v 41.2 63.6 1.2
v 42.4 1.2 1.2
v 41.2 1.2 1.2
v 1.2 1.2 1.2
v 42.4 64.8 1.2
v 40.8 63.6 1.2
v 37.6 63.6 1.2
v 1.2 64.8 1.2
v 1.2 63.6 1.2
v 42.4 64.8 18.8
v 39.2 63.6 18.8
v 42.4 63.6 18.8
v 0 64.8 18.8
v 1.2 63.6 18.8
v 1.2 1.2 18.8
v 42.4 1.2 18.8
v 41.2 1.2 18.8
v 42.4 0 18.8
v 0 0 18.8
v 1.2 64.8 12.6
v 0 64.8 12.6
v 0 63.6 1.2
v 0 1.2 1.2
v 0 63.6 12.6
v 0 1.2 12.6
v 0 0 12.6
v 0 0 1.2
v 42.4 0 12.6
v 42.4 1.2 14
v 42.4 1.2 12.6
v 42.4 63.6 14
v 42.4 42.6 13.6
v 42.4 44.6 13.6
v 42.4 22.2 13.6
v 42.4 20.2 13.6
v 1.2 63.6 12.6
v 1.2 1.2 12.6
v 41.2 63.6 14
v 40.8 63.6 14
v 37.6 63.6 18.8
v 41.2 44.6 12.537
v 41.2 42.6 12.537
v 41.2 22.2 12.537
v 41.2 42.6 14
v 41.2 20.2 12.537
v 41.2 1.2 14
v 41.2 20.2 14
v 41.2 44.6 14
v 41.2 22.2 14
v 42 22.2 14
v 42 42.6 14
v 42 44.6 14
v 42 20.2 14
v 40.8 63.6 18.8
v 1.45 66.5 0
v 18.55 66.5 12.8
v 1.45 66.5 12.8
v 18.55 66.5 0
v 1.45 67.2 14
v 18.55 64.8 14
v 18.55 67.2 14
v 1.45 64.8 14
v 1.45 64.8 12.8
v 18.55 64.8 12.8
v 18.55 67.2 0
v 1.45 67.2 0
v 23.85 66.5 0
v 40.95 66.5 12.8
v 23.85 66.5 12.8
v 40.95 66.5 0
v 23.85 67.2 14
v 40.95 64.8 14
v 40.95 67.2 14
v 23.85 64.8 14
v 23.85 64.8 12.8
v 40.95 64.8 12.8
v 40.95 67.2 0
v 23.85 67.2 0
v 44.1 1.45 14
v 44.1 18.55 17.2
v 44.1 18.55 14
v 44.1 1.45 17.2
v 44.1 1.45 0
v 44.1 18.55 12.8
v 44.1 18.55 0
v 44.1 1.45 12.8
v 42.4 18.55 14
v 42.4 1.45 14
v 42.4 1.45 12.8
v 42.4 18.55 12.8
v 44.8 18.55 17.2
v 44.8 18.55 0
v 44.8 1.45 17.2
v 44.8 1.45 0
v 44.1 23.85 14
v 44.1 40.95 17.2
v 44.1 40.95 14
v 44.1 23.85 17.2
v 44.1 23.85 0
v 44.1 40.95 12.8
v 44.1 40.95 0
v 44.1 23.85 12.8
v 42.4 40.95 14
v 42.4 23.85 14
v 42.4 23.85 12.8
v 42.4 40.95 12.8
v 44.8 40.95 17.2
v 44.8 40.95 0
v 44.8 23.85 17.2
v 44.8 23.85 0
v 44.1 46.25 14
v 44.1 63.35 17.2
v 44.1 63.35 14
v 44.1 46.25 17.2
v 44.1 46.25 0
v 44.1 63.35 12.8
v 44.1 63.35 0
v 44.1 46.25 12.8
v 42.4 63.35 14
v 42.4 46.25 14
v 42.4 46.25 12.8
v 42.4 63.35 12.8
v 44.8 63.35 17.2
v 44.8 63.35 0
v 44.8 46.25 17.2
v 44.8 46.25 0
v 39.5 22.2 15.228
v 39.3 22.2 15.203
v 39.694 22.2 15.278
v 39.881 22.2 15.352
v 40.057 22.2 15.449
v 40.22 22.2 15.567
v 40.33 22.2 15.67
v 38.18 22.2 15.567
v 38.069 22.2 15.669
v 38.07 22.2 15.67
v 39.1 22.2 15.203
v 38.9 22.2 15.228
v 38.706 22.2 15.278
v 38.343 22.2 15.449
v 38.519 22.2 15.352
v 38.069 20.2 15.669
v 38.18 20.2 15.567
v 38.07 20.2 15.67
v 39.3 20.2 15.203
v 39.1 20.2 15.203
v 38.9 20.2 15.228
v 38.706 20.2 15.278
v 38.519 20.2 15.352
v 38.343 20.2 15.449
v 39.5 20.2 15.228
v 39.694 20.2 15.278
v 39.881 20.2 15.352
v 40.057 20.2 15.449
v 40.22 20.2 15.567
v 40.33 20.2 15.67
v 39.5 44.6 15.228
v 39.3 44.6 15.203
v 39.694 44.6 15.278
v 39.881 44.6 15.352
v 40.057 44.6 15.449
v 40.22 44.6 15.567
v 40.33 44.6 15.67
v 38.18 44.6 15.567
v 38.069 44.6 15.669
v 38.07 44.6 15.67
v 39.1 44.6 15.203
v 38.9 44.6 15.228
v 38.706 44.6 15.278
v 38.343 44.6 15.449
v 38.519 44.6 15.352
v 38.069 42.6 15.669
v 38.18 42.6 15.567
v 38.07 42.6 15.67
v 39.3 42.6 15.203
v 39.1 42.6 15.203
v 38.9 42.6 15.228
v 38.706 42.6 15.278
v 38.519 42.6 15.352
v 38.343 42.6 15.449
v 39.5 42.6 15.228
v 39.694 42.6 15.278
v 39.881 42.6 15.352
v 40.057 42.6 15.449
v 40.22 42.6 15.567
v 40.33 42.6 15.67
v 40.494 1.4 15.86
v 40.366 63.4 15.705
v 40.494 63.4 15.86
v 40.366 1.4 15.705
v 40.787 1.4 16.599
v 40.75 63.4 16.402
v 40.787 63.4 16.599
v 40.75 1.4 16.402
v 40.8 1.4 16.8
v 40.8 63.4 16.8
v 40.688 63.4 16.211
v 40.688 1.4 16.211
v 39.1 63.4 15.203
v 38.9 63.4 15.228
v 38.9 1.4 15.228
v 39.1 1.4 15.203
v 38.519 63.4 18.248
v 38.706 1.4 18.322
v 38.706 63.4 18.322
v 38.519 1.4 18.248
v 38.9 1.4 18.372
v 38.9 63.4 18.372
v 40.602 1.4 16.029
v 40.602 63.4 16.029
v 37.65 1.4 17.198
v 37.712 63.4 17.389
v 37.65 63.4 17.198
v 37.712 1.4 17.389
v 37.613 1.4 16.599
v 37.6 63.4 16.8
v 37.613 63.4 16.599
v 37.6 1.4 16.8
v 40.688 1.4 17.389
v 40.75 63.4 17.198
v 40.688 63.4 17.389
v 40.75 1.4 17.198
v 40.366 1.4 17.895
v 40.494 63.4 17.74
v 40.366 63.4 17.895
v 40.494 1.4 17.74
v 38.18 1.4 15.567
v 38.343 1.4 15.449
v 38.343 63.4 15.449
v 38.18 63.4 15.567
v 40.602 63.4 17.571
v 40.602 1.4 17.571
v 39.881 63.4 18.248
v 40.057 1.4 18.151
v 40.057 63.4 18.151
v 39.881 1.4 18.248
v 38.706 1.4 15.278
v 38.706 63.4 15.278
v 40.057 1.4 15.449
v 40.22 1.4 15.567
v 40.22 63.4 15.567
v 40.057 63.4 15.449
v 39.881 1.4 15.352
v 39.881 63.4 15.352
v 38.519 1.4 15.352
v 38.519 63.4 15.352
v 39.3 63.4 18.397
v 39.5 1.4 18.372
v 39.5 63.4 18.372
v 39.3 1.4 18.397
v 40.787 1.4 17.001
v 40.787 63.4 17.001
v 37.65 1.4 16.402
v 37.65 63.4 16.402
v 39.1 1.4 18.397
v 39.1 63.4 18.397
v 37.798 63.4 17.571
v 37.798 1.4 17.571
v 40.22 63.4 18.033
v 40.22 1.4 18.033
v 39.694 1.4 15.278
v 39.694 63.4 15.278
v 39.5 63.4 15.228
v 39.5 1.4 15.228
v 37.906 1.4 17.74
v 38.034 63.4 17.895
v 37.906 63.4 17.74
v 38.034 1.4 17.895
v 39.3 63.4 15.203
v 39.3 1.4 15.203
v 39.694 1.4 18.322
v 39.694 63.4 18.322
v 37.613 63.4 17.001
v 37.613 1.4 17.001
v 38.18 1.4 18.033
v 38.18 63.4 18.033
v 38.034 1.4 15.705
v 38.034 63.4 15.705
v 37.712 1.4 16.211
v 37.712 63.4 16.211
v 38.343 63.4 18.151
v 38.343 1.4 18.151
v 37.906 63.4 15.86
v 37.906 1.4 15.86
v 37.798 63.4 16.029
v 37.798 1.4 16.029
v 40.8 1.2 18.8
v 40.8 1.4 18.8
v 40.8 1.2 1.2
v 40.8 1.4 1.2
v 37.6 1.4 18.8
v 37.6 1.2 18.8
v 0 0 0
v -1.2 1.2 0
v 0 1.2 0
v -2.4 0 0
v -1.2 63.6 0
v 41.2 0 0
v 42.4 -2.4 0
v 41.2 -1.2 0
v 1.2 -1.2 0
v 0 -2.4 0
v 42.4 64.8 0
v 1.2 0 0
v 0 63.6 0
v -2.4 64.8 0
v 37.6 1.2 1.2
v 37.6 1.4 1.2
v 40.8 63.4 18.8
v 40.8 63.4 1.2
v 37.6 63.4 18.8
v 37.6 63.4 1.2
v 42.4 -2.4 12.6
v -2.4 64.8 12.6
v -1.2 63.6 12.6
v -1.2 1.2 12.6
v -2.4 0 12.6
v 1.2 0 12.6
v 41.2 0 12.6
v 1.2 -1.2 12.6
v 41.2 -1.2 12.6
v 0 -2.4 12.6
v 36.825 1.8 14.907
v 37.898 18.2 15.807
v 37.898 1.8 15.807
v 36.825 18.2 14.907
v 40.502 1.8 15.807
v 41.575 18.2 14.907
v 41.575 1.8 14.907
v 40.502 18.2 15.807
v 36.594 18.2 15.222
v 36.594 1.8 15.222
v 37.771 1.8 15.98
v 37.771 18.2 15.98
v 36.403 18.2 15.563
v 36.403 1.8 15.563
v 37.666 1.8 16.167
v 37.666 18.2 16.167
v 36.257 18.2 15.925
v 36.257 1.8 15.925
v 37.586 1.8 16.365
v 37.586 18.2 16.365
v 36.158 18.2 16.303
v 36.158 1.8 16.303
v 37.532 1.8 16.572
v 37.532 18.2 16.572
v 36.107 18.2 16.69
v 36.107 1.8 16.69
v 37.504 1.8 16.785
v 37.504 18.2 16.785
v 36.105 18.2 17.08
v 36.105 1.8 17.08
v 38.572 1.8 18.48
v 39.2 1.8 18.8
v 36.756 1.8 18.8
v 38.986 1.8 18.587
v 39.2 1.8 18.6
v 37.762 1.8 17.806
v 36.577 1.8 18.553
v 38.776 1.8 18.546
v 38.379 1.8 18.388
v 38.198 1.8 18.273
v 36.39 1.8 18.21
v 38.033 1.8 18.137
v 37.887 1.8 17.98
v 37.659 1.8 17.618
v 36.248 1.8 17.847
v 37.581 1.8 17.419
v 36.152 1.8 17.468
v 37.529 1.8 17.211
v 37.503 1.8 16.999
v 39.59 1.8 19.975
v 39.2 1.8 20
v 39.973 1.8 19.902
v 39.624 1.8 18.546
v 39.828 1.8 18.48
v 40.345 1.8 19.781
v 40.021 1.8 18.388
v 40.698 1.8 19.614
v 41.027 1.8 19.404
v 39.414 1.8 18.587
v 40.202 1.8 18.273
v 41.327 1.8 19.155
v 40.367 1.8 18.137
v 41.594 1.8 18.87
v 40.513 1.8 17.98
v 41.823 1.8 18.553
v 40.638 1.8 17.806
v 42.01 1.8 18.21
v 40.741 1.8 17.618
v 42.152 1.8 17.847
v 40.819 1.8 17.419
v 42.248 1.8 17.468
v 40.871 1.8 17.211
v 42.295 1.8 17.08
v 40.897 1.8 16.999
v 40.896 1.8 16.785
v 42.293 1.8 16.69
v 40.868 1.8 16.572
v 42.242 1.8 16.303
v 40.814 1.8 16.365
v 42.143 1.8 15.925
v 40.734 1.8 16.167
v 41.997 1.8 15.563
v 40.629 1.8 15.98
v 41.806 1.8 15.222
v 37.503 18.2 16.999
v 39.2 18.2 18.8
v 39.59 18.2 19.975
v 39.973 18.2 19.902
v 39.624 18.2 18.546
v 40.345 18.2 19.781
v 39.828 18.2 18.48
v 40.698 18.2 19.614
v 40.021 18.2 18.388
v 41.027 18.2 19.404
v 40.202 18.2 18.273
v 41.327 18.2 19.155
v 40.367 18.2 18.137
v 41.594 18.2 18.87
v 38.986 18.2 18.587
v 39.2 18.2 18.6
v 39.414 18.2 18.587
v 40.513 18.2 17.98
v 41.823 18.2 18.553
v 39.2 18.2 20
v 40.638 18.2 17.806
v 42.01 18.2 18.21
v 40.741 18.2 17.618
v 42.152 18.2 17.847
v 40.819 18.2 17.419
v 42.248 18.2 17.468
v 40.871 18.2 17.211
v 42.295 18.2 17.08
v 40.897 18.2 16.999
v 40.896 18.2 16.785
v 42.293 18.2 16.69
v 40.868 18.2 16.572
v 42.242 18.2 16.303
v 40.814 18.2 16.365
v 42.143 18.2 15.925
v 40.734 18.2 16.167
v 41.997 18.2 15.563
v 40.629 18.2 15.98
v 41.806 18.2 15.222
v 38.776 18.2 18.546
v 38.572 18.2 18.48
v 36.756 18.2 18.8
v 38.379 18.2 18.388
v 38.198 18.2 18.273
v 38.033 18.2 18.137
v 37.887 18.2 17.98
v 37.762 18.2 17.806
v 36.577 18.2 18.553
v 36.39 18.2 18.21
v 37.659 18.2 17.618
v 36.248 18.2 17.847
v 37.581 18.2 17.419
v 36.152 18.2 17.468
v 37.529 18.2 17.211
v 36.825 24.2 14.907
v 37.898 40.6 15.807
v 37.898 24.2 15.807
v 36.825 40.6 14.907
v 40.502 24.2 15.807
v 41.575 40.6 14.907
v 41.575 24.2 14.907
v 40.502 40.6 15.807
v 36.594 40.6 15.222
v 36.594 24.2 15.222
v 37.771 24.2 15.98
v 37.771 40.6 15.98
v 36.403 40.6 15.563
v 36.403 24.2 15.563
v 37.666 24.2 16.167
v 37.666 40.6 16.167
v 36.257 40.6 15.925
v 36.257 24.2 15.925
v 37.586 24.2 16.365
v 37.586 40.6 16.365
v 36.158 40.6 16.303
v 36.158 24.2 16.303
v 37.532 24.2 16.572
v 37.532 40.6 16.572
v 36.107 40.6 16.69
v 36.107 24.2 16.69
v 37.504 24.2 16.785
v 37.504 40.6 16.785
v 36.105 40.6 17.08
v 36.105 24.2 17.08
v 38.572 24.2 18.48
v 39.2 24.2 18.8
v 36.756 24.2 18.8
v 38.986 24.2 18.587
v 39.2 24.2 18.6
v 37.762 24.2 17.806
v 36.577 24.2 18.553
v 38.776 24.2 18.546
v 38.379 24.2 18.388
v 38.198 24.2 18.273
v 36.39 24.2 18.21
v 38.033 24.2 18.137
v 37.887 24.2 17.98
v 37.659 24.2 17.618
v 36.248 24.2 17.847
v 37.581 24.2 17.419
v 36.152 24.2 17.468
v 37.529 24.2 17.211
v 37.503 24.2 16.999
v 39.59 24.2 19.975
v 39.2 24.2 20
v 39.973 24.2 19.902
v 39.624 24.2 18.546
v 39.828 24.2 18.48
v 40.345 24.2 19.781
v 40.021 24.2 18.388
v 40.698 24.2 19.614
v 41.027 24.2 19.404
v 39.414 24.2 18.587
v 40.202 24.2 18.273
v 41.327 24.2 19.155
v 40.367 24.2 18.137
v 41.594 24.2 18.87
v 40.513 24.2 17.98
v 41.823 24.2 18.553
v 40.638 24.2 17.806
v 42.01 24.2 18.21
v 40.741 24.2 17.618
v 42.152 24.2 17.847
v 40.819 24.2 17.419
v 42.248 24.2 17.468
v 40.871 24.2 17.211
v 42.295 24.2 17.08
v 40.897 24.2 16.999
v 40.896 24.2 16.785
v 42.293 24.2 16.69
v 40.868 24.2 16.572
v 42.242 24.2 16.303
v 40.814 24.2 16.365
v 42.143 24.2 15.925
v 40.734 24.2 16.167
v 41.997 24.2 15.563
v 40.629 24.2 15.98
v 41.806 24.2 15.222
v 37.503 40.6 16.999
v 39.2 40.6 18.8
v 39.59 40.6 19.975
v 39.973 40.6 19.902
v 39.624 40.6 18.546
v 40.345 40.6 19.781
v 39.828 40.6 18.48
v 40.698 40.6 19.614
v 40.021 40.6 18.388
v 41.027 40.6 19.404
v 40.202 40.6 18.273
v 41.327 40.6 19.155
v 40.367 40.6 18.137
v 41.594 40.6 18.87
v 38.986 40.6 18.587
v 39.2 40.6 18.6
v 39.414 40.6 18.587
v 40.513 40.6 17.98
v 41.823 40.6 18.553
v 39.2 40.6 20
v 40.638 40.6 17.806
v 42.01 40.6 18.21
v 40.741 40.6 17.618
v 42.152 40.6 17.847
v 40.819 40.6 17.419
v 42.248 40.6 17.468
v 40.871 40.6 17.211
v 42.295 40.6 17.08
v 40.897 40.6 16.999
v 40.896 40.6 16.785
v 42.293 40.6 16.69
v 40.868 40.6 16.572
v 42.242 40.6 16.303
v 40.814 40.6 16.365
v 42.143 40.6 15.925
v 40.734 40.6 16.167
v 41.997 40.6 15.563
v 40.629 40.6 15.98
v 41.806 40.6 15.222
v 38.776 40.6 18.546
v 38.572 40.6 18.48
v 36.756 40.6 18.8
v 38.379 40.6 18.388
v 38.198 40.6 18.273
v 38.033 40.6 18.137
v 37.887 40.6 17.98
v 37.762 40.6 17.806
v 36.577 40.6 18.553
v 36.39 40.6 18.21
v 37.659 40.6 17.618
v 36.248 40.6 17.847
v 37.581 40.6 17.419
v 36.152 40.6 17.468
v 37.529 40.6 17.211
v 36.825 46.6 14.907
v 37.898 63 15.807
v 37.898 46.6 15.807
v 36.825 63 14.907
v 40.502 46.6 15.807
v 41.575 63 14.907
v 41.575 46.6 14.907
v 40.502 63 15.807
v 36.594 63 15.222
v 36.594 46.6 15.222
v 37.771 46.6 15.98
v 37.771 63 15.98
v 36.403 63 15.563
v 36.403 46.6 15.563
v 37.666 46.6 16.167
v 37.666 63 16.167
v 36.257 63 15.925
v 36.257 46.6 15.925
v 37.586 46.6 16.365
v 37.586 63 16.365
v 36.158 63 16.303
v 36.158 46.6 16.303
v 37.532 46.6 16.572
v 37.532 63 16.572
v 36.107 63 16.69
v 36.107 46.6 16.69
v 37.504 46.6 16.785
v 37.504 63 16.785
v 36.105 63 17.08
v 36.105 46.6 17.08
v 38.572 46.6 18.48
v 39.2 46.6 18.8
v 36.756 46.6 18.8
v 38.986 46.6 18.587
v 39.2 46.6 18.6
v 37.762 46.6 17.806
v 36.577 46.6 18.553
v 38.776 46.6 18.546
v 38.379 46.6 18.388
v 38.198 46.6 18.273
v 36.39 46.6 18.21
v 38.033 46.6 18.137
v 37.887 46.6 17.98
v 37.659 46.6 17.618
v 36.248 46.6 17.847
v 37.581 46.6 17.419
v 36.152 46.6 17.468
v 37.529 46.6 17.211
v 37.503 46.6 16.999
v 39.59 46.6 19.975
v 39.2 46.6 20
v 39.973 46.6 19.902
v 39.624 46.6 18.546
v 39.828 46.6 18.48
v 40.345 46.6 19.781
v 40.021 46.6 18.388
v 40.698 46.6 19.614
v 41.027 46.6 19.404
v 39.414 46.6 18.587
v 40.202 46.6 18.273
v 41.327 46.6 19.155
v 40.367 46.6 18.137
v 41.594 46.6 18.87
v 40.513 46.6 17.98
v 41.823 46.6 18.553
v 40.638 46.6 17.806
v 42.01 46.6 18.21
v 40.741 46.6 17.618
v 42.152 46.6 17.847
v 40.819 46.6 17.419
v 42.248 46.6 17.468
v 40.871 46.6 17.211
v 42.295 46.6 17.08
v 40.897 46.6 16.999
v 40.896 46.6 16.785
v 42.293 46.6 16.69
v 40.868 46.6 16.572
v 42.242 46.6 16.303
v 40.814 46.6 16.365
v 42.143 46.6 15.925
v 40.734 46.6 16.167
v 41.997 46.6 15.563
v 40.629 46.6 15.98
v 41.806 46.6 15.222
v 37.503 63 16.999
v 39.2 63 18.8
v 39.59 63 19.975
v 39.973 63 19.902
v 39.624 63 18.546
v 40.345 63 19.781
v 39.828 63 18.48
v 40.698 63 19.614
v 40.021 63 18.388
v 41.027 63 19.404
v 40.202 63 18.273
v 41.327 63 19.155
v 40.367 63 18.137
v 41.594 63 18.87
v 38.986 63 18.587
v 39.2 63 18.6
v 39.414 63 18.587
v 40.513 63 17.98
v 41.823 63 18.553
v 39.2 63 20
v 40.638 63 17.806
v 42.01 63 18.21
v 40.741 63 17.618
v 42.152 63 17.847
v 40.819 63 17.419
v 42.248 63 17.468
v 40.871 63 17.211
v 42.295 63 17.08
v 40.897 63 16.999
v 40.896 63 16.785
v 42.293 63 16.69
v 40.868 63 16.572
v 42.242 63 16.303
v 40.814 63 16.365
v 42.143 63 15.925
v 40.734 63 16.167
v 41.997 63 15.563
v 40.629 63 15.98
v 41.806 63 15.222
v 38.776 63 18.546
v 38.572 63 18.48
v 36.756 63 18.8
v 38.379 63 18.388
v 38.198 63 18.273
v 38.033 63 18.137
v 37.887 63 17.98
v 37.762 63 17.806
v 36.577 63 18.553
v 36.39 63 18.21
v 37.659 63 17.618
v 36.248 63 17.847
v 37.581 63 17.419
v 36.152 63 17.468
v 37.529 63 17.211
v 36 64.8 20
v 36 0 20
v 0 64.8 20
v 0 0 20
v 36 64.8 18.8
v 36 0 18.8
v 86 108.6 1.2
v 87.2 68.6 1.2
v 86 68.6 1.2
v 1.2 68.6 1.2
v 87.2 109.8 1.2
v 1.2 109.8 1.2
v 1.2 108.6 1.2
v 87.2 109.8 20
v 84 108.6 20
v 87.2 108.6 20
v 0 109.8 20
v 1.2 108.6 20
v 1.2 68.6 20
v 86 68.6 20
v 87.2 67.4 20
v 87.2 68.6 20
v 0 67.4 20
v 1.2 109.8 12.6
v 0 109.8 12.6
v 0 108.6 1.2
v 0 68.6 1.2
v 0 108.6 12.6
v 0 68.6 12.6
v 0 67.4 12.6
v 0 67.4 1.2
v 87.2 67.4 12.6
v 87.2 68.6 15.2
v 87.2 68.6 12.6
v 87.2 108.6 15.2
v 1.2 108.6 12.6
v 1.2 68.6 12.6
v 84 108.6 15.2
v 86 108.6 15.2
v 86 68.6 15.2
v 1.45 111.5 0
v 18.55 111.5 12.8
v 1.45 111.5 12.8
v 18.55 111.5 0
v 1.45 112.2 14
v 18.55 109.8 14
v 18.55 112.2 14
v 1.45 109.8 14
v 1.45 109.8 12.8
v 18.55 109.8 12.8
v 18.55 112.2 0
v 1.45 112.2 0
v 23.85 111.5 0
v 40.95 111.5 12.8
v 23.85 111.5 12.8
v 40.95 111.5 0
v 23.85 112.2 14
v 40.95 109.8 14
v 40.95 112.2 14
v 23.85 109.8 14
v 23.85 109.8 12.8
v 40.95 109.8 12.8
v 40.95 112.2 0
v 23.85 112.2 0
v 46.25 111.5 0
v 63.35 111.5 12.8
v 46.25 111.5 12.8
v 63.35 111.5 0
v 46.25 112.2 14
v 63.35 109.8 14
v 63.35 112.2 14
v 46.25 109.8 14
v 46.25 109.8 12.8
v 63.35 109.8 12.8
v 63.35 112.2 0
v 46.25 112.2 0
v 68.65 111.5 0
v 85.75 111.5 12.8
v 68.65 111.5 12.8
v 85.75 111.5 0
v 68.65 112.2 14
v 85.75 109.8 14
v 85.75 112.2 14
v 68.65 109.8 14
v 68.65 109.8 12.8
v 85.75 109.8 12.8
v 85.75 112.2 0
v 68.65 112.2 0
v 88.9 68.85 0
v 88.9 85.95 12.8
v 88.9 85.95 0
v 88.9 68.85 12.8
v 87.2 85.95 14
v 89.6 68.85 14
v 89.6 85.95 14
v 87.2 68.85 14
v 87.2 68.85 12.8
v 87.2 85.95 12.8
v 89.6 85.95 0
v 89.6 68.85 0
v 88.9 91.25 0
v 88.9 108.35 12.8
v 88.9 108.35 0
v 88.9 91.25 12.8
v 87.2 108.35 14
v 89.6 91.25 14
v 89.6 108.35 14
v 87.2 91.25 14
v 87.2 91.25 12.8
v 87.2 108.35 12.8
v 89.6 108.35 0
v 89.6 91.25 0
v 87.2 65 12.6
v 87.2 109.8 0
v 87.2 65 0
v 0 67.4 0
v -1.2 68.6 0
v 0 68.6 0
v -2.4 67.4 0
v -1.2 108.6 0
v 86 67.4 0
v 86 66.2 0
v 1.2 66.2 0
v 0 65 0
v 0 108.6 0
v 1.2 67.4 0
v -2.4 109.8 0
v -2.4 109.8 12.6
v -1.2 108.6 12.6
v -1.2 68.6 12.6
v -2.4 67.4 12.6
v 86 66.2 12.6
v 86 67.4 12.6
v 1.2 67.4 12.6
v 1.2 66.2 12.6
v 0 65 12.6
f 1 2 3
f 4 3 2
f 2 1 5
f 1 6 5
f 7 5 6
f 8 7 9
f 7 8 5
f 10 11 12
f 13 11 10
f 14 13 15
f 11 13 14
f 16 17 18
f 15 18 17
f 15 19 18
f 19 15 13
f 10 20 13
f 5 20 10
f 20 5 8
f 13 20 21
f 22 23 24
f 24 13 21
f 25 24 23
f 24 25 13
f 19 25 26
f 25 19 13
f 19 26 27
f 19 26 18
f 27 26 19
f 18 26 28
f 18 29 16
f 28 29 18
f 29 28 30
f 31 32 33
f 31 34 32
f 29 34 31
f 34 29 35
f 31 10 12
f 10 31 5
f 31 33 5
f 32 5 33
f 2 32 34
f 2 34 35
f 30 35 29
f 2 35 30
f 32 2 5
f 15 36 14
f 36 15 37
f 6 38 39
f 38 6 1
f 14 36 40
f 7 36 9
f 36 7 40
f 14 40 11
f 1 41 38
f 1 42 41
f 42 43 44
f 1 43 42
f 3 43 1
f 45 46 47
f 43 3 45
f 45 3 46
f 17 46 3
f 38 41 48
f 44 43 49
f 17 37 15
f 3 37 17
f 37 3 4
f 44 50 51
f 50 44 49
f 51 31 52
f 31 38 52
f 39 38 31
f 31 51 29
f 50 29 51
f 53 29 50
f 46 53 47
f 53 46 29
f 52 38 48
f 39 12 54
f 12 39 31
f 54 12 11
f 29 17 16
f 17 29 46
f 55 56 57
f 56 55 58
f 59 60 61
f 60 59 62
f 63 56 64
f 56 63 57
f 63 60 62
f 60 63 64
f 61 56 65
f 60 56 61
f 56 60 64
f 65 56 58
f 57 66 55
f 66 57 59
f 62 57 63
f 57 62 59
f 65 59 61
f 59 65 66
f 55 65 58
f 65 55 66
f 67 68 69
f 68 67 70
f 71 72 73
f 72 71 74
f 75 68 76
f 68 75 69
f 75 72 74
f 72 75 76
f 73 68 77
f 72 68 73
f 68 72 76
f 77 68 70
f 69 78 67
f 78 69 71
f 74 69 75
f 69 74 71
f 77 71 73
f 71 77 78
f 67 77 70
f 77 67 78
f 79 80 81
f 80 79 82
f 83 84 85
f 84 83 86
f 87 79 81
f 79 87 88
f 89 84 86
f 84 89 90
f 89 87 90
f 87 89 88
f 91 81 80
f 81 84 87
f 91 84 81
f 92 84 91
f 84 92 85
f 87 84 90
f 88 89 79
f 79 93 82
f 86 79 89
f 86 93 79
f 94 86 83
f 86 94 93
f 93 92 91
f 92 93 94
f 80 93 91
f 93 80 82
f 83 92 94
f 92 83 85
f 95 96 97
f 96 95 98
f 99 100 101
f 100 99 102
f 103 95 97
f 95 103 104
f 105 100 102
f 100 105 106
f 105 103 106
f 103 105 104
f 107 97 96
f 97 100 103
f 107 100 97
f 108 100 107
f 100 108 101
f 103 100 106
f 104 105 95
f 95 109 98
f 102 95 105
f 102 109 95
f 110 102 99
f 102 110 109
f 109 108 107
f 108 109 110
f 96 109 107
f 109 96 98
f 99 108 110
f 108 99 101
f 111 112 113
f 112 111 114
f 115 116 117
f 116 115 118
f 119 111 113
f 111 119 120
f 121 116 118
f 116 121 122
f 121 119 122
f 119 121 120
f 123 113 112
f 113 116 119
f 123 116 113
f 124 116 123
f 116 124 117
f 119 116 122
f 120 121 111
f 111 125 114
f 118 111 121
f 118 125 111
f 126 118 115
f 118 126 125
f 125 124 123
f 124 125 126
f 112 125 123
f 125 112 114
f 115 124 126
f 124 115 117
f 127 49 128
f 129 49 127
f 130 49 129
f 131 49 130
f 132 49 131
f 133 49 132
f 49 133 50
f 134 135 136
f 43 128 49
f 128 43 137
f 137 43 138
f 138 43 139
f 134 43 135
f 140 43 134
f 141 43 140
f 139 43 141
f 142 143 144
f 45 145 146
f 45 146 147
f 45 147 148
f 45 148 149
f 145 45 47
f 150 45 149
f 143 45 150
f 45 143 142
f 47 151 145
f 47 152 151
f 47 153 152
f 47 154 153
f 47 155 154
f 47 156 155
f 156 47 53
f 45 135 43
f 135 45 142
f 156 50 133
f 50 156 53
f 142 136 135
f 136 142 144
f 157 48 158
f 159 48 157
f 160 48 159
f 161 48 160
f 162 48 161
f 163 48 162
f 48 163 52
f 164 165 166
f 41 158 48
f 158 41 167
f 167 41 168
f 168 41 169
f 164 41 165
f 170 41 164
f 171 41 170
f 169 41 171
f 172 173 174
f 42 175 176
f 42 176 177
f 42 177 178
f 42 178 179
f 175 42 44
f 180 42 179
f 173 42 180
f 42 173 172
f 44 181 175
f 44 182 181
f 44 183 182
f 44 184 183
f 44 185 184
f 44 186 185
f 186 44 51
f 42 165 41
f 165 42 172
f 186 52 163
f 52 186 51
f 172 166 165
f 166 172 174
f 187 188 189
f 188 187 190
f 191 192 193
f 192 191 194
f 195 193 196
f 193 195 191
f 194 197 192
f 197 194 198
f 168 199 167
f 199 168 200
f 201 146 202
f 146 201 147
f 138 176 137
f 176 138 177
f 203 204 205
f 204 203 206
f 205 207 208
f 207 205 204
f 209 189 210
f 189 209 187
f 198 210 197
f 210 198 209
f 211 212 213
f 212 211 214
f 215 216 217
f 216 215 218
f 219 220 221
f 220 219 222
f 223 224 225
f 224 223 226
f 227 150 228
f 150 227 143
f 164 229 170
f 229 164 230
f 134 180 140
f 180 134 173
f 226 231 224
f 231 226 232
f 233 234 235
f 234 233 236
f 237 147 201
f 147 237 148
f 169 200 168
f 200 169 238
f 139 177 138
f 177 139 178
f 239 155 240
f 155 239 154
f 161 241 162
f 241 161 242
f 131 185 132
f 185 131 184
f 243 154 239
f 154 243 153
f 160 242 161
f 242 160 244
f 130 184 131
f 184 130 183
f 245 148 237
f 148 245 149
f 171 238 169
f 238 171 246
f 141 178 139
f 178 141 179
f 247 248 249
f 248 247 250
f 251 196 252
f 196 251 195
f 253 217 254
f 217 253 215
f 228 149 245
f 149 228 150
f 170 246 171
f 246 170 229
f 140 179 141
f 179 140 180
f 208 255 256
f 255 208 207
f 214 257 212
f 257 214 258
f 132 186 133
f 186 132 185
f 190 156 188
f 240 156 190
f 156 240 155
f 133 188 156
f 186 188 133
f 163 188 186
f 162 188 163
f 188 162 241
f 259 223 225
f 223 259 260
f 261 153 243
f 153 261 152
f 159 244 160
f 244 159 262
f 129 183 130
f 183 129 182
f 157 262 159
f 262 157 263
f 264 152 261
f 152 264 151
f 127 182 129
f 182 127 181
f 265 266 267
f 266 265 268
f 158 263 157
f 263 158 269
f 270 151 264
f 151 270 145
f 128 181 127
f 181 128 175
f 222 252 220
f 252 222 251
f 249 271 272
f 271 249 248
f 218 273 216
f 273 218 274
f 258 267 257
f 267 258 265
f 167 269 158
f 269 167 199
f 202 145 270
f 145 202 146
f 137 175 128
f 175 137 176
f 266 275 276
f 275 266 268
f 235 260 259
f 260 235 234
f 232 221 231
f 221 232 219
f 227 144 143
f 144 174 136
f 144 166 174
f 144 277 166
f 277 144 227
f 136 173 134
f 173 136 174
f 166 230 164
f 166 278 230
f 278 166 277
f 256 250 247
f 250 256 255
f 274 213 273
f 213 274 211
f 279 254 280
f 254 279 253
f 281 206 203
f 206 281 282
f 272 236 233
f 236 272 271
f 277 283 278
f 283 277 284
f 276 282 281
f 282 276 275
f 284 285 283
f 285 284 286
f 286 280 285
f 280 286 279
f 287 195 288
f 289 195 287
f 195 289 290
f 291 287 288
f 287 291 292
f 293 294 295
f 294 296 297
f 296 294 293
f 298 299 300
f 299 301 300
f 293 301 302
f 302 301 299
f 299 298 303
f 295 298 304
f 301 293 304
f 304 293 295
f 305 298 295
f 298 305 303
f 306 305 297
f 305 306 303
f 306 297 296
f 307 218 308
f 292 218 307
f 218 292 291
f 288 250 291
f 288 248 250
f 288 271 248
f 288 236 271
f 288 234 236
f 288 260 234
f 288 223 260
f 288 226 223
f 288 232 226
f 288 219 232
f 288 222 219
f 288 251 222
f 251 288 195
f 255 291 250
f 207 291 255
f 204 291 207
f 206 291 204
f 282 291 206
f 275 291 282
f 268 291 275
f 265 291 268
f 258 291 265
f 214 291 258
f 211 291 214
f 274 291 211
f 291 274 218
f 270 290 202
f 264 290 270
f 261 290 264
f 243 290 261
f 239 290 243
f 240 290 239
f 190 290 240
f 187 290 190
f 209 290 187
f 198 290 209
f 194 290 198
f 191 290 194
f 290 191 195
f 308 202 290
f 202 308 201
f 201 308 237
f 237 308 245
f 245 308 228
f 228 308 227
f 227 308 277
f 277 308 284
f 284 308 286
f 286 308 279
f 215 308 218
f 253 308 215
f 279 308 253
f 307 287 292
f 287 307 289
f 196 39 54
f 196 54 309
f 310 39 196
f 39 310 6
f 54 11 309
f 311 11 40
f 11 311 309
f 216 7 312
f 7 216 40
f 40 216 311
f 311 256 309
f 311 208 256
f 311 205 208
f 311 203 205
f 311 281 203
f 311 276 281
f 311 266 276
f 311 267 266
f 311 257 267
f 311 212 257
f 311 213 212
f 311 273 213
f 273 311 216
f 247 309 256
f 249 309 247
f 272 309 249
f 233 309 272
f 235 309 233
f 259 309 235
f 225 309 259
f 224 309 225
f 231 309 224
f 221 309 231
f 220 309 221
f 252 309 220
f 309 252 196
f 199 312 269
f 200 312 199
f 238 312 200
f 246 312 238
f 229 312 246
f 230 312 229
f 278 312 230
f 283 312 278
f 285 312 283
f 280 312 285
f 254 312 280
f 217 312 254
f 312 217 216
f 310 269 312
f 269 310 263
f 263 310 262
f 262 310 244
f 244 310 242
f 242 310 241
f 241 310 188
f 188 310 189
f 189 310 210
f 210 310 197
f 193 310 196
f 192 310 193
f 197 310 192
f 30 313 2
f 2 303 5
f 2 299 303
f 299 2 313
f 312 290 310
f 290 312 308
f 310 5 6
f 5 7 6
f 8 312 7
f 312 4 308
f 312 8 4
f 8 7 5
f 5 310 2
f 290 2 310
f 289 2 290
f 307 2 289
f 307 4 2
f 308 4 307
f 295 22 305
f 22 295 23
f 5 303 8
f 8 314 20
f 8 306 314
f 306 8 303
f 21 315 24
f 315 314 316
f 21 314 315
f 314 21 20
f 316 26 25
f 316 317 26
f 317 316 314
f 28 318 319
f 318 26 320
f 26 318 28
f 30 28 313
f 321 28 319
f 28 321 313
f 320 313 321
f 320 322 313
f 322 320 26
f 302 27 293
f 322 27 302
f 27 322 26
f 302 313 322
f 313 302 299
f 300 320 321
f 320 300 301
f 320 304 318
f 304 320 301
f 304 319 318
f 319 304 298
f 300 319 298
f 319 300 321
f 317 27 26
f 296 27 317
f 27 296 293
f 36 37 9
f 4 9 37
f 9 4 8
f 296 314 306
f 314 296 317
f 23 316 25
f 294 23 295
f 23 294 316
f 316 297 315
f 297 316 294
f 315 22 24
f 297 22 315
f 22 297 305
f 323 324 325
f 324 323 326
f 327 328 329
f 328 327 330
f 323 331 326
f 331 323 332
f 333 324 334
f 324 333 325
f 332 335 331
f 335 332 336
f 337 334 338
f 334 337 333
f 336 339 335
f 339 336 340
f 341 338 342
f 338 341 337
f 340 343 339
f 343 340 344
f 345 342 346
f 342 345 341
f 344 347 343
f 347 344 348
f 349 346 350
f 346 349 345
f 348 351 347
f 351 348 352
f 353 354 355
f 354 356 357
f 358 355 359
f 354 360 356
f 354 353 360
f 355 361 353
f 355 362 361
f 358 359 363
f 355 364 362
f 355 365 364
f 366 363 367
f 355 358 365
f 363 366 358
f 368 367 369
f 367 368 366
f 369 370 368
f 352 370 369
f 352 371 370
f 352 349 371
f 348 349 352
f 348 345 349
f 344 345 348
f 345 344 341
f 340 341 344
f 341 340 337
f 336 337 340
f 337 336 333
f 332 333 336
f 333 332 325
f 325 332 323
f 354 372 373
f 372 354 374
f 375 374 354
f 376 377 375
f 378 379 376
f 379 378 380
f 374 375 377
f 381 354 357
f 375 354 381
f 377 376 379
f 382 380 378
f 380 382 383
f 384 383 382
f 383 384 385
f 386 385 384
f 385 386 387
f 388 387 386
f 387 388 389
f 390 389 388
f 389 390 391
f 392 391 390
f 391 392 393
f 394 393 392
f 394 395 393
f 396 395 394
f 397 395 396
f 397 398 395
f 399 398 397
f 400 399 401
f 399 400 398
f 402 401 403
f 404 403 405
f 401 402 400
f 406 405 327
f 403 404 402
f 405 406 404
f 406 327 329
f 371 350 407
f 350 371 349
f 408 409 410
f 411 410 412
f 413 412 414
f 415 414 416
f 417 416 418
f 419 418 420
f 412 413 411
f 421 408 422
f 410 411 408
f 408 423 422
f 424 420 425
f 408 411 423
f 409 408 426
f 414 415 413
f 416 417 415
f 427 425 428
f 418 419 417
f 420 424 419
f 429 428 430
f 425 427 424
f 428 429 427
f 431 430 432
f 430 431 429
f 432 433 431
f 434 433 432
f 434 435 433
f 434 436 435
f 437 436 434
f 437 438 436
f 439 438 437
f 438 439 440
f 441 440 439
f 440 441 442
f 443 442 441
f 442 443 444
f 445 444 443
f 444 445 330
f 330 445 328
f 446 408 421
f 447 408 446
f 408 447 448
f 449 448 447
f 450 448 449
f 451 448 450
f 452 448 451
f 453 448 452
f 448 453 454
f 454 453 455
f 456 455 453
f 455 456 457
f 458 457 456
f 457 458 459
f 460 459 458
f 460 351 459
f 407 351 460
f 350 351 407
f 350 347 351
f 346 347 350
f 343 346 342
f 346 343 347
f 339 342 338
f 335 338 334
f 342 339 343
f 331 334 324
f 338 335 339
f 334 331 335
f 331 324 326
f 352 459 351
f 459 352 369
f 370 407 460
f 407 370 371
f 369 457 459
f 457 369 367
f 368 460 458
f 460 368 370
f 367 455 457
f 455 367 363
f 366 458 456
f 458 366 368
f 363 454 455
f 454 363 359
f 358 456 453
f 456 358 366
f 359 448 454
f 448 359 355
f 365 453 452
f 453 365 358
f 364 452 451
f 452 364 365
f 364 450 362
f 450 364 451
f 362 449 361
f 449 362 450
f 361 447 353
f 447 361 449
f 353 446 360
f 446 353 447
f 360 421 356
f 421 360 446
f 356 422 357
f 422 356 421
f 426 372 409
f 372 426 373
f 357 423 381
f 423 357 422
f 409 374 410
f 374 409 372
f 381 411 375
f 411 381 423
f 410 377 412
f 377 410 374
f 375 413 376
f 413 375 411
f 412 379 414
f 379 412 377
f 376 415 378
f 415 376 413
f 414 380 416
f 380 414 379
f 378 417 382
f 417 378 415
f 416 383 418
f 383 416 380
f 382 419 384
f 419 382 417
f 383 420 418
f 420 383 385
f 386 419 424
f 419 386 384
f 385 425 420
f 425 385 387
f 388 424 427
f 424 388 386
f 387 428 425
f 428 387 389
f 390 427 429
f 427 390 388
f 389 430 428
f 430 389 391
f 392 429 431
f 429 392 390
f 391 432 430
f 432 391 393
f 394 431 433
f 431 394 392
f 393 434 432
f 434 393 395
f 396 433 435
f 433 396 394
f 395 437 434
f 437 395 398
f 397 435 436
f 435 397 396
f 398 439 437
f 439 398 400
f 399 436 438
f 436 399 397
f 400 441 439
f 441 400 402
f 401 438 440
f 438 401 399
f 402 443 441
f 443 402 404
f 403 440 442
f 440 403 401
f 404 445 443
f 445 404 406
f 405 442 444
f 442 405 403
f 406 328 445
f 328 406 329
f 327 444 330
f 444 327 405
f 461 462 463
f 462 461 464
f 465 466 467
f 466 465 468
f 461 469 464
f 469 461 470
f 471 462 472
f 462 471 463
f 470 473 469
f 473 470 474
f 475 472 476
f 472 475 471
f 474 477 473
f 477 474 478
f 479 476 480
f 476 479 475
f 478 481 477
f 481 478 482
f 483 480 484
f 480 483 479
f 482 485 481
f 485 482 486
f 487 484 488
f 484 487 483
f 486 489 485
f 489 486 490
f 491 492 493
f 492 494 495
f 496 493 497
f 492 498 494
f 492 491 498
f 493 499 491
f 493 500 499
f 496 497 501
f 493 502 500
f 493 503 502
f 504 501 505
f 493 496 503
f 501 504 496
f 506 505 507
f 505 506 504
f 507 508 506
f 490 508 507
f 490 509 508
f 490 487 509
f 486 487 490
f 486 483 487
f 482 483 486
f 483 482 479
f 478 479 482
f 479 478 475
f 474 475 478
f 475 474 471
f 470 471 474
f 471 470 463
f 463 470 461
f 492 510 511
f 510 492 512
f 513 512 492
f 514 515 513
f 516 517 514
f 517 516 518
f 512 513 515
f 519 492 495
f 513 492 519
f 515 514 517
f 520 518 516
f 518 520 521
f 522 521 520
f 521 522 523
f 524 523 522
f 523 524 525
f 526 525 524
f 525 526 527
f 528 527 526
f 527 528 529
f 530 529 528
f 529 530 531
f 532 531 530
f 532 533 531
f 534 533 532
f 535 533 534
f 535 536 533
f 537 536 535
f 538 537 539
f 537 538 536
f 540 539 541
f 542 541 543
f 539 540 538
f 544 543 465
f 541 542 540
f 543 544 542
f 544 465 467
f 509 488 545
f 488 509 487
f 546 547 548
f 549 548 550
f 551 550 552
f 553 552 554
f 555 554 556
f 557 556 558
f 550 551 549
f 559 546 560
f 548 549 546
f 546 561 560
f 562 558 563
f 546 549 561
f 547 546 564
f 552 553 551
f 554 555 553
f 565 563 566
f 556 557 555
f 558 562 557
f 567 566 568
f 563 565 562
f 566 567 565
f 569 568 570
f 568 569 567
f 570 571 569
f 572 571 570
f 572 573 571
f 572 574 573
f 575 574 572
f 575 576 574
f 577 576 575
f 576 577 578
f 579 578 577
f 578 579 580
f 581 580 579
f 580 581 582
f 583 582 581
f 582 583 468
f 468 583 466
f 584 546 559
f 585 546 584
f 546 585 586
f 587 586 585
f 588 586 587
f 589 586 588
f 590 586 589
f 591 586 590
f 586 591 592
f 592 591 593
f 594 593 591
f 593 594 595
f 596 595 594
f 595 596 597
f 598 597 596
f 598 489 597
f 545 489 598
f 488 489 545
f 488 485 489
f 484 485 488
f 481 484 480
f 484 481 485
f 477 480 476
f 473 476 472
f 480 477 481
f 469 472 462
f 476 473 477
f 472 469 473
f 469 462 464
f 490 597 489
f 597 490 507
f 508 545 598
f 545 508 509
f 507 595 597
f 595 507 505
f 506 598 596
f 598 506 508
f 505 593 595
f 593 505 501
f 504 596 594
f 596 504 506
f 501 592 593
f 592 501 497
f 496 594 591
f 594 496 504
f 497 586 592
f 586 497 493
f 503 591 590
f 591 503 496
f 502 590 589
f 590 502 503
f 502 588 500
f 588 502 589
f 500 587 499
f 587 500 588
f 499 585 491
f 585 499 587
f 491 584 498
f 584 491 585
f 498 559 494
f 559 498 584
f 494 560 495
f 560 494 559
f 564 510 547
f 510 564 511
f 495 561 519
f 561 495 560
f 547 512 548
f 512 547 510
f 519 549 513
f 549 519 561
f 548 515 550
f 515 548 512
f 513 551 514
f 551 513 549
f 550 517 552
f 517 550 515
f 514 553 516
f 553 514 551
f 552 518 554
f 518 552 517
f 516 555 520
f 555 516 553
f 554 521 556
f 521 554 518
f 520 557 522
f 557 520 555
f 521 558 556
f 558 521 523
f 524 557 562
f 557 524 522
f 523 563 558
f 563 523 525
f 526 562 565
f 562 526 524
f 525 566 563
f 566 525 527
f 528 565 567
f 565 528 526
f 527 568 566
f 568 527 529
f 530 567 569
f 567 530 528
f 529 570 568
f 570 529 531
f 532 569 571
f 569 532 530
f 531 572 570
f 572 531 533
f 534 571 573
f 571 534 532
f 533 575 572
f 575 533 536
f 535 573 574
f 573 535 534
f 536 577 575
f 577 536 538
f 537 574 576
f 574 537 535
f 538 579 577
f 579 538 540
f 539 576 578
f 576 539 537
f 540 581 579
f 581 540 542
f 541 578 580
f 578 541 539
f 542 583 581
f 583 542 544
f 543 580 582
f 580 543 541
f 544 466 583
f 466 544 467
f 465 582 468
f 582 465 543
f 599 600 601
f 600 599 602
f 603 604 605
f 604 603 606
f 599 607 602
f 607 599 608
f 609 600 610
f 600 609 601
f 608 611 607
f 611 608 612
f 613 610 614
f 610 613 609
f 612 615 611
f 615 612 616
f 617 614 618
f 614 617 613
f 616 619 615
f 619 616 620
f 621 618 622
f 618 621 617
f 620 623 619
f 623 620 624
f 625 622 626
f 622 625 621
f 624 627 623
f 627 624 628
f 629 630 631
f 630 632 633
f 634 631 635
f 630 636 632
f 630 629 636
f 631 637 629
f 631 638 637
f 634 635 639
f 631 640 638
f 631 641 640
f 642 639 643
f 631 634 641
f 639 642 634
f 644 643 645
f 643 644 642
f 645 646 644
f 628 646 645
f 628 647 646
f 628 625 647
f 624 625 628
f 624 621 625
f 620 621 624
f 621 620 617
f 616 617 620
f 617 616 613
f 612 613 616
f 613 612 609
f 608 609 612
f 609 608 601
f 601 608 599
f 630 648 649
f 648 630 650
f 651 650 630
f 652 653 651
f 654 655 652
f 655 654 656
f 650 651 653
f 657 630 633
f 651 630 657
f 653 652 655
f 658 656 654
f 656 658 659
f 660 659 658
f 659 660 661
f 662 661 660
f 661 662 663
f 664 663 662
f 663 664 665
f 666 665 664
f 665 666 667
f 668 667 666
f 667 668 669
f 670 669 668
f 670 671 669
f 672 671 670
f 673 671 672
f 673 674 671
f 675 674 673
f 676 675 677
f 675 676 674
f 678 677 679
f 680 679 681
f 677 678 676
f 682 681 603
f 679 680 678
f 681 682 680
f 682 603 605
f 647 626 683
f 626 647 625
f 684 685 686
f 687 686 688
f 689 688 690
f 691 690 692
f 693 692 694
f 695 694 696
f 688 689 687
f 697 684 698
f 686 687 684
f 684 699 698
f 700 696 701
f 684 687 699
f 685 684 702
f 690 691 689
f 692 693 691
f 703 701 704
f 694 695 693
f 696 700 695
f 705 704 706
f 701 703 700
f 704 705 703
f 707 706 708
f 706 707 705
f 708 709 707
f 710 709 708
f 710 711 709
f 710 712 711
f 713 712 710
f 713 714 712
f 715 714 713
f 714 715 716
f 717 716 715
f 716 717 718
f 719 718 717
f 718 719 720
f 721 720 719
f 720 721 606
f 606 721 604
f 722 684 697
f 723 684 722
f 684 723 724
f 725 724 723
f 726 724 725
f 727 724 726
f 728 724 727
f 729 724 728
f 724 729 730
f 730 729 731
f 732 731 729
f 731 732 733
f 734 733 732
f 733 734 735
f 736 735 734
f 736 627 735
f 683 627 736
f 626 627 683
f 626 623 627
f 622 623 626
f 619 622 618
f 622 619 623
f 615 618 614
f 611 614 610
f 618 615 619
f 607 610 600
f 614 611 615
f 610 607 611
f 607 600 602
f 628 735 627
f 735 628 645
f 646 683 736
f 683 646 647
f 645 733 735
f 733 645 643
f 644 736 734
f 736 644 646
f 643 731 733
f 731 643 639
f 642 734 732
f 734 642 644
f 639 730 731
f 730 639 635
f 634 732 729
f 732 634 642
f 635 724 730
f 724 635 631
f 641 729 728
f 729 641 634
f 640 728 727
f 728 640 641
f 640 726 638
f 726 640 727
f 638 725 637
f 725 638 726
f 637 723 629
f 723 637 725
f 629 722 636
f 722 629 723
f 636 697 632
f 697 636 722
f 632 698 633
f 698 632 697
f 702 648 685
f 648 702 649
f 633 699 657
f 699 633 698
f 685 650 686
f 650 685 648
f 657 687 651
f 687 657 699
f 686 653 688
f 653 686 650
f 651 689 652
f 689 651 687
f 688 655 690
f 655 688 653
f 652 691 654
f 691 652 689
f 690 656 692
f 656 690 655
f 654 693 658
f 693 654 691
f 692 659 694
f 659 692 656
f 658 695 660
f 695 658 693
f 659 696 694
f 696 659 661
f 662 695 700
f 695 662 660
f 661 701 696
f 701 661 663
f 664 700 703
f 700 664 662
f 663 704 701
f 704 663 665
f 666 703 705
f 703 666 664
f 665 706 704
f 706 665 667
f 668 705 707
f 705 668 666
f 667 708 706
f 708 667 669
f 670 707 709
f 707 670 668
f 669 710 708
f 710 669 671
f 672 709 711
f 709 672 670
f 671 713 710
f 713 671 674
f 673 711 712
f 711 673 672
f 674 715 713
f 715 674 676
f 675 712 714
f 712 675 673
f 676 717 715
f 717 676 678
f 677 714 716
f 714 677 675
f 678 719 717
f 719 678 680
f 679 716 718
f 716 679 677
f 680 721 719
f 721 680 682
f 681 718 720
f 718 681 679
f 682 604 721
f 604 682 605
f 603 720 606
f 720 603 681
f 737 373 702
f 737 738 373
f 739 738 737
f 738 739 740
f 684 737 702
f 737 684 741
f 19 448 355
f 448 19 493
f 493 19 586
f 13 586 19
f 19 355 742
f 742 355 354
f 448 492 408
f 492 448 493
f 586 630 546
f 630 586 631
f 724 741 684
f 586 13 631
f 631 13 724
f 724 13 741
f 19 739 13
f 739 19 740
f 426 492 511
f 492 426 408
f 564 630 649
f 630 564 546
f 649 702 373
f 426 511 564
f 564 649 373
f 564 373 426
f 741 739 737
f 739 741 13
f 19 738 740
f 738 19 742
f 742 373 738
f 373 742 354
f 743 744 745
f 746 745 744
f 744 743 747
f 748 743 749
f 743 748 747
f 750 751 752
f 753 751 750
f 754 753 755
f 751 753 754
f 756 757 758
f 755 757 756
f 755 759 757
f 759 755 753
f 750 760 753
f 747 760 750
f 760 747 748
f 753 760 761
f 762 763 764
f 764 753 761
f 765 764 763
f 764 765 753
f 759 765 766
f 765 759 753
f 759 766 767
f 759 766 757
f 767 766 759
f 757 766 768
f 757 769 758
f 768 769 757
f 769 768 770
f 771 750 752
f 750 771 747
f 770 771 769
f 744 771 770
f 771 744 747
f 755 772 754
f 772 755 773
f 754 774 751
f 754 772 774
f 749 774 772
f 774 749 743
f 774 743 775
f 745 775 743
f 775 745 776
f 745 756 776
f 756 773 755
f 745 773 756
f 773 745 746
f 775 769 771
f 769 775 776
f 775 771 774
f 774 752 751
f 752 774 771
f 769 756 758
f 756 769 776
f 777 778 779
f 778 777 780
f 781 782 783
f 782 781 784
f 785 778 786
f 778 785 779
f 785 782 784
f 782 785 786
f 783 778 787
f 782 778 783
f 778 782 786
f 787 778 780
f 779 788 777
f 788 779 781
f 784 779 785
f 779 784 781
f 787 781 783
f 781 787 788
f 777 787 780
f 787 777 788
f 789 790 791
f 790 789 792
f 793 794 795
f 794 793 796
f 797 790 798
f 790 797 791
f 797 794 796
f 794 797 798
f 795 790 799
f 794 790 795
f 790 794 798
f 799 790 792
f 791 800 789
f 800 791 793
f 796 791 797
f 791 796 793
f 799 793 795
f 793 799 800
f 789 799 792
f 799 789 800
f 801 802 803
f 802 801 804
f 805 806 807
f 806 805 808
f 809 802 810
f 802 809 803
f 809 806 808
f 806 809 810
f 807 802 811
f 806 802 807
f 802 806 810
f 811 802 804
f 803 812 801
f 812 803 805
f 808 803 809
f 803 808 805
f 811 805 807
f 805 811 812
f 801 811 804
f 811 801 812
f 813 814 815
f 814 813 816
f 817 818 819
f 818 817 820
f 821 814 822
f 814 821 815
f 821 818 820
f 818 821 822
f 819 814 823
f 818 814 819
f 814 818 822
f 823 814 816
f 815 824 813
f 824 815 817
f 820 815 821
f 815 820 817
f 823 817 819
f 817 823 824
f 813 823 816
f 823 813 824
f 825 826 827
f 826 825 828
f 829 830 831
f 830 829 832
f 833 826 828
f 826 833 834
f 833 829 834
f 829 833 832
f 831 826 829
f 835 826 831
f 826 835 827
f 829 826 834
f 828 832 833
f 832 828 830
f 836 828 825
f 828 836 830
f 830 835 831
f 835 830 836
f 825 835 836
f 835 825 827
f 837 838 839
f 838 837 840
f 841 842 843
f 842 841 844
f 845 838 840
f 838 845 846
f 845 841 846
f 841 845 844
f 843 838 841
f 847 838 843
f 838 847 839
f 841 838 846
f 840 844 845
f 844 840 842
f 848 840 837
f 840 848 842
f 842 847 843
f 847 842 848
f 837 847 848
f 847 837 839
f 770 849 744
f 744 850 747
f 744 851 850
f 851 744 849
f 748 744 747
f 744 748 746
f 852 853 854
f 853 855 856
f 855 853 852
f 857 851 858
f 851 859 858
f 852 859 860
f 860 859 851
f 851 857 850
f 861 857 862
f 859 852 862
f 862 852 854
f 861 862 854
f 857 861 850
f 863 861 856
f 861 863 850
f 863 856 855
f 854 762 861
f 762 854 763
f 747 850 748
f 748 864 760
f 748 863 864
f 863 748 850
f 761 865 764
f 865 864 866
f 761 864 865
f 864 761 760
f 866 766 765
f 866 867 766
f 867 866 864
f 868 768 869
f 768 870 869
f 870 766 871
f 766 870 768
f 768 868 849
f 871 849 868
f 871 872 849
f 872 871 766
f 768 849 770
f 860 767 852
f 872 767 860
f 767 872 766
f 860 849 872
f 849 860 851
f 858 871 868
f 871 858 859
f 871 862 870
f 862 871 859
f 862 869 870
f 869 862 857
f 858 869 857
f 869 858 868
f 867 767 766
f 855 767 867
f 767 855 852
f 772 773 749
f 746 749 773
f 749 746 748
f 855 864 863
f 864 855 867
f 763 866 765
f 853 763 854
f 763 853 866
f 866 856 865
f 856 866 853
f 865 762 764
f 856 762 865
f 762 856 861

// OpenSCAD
// file: utils.scad
module square_sleeve (size, t) {
  linear_extrude(size[2]) {
    difference () {
      square([size[0], size[1]]);
      translate([t, t]) square([size[0] - 2 * t, size[1] - 2 * t]);
    }
  }
}
module circle_sleeve (o_d, h, t, angle) {
  rotate_extrude (angle = angle) {
    translate([o_d / 2 - t, 0]) square([t, h]);
  }
}
// file: parameters.scad
press_fit = 0.05;
tight_fit = 0.1;
fit = 0.2;
loose_fit = 0.5;

// `u` - a single unit of size within our containers. Containers with the
// same `u` and `wall_t` can compose with each other.
u = 20;

// Wall thickness.
wall_t = 1.2; // Minimum thickness that makes sense with 0.4 mm FDM.

total_u = u + 2 * wall_t;

hinge_u = 1.6; // Minimum "unit" that produces a sensible hinge with 0.4 mm FDM.
hinge_o_d = hinge_u * 4;
hinge_i_d = hinge_u * 2;
hinge_wall_t = (hinge_o_d - hinge_i_d) / 2;

// Hinge supports:
hinge_support_step = 20; // How often to place a support for the hinge. 
hinge_support_w = 2;
hinge_support_t = hinge_u;
hinge_rib_t = fit;

lid_hinge_angle = 260;
// file: sizing.scad
include <parameters.scad>;

function outer_x (x) = x * u + (x - 1) * (2 * wall_t);
function outer_y (y) = y * u + (y - 1) * (2 * wall_t);
// file: lid.scad
use <utils.scad>;
use <sizing.scad>;
include <parameters.scad>;

module lid (size) {
  // This is so when `hinge_support_step = u`, we get an aesthetically pleasing
  // effect with the insert. There, I'm that vain.
  receptacle_fit = 2 * fit + hinge_rib_t;

  o_x = outer_x(size[0]);
  o_y = outer_y(size[1]);
  w = o_y - 2 * wall_t;

  w_fit = w - 2 * receptacle_fit;
  body_l = o_x - hinge_o_d;

  translate([0, 0, hinge_u - wall_t]) {
    hull () {
      cube([body_l, outer_y(size[1]), wall_t]);
      translate([body_l, wall_t + (w - w_fit) / 2])
        cube([hinge_o_d / 2, w_fit, wall_t]);
    }
  }

  receptacles = floor(o_y / hinge_support_step);
  receptacle_w = hinge_support_step - 2 * receptacle_fit - 2 * wall_t;
  translate([body_l + hinge_o_d / 2, wall_t, -hinge_o_d / 4 + fit / 2]) {
    for (i = [1 : 1 : receptacles]) {
      translate([
        0,
        receptacle_fit + (hinge_support_step + 2 * wall_t) * (i - 1),
        0
      ]) {
        rotate([270, (360 - lid_hinge_angle) / 2 + 90, 0]) {
          circle_sleeve(
            hinge_o_d - fit,
            receptacle_w,
            // The `tight_fit` is the fit around the hinge, `fit / 2` comes
            // from the `- fit` on the outer diatemeter.
            hinge_wall_t - tight_fit - fit / 2,
            lid_hinge_angle
          );
        }
      }
    }
  }

}

if (!is_undef(size)) {
  rotate([180, 0, 0]) lid(size);
}
// file: compartment.scad
use <utils.scad>;
use <sizing.scad>;
include <parameters.scad>;

module receptacle (o_y, h) {
  receptacle_d = 3 * wall_t;
  square_sleeve([receptacle_d, o_y, h], wall_t);
}

module hinge_supports (i_y) {
  supports = floor(i_y / (hinge_support_step + hinge_support_w));
  if (supports > 0) {
    for (i = [1 : supports]) {
      translate([0, -hinge_support_w / 2 + i * hinge_support_step + (i - 1) * (2 * wall_t), 0])
        rotate([0, 135, 0])
          cube([hinge_support_t, hinge_support_w, sqrt(pow(hinge_o_d, 2) * 2) / 2]);
    }
  }
}

module hinge (i_y, o_z) {
  // Hinge bridge:
  translate([0, wall_t, o_z - hinge_i_d]) {
    rotate([270, 0, 0]) cylinder(d = hinge_i_d, h = i_y);
    hinge_supports(i_y);
  }

  // Ribs (in hopes of supporting the structure a little):
  translate([-hinge_i_d / 2, wall_t])
    cube([hinge_i_d, hinge_rib_t, o_z - wall_t]);
  translate([-hinge_i_d / 2, i_y + wall_t - hinge_rib_t])
    cube([hinge_i_d, hinge_rib_t, o_z - wall_t]);
}

module insert (o_z, bridge_h, lid_guard = false) {
  x_fit = loose_fit;
  y_fit = loose_fit;
  insert_w = u - 2 * wall_t - y_fit;

  translate([0, y_fit / 2]) {
    translate([0, 0, bridge_h]) cube([wall_t + x_fit, insert_w, wall_t]);
    translate([wall_t + x_fit, 0])
      cube([wall_t - x_fit, insert_w, bridge_h + wall_t + (lid_guard ? hinge_i_d : 0)]);
  }
}

//
// Single compartment of given size in `u`.
//
module compartment (size, lid_hinge = false) {
  o_x = outer_x(size[0]);
  o_y = outer_y(size[1]);
  o_z = size[2] * u;

  i_x = o_x - 2 * wall_t;
  i_y = o_y - 2 * wall_t;
  i_z = o_z - (lid_hinge ? 2 : 1) * wall_t; // The "second" `wall_t` is for any lids, etc. we might want to attach.

  insert_bridge_h = o_z - hinge_i_d - hinge_wall_t - 2 * wall_t;

  // Bottom:
  cube([o_x, o_y, wall_t]);

  // Walls:
  translate([0, 0, wall_t]) {
    difference () {
      square_sleeve([o_x, o_y, i_z], wall_t);
      // Clear out space for the lid's hinge to rotate around in.
      translate([o_x - hinge_i_d, wall_t, i_z - hinge_i_d - hinge_wall_t])
        cube([hinge_i_d, o_y - 2 * wall_t, hinge_i_d + hinge_wall_t]);
    }
  }

  translate([o_x, -2 * wall_t]) rotate([0, 0, 90]) receptacle(o_x, insert_bridge_h - fit);
  translate([wall_t, o_y]) rotate([0, 0, 180]) receptacle(o_y, insert_bridge_h - fit);

  for (j = [1 : floor(size[0])])
    translate([wall_t + total_u * (j - 1), o_y])
      rotate([0, 0, 270]) mirror([1, 0, 0])
        insert(o_z, insert_bridge_h);

  for (i = [1 : floor(size[1])])
    translate([o_x, wall_t + total_u * (i - 1)]) insert(o_z, insert_bridge_h, lid_guard = lid_hinge);

  if (lid_hinge) {
    translate([o_x - hinge_o_d / 2, 0]) hinge(i_y, o_z);
  }
}

if (!is_undef(size)) {
  compartment(size, true);
}
// main file
use <compartment.scad>;
use <lid.scad>;
use <sizing.scad>;
include <parameters.scad>;

$fn = 50;

size0 = [2, 3, 1];
size1 = [4, 2, 1];

compartment(size0, lid_hinge = true);
translate([0, 0, size0[2] * u - hinge_i_d / 2]) lid(size0);

translate([0, outer_y(size0[1]) + 2 * wall_t + fit, 0]) compartment(size1, lid_hinge = false);
